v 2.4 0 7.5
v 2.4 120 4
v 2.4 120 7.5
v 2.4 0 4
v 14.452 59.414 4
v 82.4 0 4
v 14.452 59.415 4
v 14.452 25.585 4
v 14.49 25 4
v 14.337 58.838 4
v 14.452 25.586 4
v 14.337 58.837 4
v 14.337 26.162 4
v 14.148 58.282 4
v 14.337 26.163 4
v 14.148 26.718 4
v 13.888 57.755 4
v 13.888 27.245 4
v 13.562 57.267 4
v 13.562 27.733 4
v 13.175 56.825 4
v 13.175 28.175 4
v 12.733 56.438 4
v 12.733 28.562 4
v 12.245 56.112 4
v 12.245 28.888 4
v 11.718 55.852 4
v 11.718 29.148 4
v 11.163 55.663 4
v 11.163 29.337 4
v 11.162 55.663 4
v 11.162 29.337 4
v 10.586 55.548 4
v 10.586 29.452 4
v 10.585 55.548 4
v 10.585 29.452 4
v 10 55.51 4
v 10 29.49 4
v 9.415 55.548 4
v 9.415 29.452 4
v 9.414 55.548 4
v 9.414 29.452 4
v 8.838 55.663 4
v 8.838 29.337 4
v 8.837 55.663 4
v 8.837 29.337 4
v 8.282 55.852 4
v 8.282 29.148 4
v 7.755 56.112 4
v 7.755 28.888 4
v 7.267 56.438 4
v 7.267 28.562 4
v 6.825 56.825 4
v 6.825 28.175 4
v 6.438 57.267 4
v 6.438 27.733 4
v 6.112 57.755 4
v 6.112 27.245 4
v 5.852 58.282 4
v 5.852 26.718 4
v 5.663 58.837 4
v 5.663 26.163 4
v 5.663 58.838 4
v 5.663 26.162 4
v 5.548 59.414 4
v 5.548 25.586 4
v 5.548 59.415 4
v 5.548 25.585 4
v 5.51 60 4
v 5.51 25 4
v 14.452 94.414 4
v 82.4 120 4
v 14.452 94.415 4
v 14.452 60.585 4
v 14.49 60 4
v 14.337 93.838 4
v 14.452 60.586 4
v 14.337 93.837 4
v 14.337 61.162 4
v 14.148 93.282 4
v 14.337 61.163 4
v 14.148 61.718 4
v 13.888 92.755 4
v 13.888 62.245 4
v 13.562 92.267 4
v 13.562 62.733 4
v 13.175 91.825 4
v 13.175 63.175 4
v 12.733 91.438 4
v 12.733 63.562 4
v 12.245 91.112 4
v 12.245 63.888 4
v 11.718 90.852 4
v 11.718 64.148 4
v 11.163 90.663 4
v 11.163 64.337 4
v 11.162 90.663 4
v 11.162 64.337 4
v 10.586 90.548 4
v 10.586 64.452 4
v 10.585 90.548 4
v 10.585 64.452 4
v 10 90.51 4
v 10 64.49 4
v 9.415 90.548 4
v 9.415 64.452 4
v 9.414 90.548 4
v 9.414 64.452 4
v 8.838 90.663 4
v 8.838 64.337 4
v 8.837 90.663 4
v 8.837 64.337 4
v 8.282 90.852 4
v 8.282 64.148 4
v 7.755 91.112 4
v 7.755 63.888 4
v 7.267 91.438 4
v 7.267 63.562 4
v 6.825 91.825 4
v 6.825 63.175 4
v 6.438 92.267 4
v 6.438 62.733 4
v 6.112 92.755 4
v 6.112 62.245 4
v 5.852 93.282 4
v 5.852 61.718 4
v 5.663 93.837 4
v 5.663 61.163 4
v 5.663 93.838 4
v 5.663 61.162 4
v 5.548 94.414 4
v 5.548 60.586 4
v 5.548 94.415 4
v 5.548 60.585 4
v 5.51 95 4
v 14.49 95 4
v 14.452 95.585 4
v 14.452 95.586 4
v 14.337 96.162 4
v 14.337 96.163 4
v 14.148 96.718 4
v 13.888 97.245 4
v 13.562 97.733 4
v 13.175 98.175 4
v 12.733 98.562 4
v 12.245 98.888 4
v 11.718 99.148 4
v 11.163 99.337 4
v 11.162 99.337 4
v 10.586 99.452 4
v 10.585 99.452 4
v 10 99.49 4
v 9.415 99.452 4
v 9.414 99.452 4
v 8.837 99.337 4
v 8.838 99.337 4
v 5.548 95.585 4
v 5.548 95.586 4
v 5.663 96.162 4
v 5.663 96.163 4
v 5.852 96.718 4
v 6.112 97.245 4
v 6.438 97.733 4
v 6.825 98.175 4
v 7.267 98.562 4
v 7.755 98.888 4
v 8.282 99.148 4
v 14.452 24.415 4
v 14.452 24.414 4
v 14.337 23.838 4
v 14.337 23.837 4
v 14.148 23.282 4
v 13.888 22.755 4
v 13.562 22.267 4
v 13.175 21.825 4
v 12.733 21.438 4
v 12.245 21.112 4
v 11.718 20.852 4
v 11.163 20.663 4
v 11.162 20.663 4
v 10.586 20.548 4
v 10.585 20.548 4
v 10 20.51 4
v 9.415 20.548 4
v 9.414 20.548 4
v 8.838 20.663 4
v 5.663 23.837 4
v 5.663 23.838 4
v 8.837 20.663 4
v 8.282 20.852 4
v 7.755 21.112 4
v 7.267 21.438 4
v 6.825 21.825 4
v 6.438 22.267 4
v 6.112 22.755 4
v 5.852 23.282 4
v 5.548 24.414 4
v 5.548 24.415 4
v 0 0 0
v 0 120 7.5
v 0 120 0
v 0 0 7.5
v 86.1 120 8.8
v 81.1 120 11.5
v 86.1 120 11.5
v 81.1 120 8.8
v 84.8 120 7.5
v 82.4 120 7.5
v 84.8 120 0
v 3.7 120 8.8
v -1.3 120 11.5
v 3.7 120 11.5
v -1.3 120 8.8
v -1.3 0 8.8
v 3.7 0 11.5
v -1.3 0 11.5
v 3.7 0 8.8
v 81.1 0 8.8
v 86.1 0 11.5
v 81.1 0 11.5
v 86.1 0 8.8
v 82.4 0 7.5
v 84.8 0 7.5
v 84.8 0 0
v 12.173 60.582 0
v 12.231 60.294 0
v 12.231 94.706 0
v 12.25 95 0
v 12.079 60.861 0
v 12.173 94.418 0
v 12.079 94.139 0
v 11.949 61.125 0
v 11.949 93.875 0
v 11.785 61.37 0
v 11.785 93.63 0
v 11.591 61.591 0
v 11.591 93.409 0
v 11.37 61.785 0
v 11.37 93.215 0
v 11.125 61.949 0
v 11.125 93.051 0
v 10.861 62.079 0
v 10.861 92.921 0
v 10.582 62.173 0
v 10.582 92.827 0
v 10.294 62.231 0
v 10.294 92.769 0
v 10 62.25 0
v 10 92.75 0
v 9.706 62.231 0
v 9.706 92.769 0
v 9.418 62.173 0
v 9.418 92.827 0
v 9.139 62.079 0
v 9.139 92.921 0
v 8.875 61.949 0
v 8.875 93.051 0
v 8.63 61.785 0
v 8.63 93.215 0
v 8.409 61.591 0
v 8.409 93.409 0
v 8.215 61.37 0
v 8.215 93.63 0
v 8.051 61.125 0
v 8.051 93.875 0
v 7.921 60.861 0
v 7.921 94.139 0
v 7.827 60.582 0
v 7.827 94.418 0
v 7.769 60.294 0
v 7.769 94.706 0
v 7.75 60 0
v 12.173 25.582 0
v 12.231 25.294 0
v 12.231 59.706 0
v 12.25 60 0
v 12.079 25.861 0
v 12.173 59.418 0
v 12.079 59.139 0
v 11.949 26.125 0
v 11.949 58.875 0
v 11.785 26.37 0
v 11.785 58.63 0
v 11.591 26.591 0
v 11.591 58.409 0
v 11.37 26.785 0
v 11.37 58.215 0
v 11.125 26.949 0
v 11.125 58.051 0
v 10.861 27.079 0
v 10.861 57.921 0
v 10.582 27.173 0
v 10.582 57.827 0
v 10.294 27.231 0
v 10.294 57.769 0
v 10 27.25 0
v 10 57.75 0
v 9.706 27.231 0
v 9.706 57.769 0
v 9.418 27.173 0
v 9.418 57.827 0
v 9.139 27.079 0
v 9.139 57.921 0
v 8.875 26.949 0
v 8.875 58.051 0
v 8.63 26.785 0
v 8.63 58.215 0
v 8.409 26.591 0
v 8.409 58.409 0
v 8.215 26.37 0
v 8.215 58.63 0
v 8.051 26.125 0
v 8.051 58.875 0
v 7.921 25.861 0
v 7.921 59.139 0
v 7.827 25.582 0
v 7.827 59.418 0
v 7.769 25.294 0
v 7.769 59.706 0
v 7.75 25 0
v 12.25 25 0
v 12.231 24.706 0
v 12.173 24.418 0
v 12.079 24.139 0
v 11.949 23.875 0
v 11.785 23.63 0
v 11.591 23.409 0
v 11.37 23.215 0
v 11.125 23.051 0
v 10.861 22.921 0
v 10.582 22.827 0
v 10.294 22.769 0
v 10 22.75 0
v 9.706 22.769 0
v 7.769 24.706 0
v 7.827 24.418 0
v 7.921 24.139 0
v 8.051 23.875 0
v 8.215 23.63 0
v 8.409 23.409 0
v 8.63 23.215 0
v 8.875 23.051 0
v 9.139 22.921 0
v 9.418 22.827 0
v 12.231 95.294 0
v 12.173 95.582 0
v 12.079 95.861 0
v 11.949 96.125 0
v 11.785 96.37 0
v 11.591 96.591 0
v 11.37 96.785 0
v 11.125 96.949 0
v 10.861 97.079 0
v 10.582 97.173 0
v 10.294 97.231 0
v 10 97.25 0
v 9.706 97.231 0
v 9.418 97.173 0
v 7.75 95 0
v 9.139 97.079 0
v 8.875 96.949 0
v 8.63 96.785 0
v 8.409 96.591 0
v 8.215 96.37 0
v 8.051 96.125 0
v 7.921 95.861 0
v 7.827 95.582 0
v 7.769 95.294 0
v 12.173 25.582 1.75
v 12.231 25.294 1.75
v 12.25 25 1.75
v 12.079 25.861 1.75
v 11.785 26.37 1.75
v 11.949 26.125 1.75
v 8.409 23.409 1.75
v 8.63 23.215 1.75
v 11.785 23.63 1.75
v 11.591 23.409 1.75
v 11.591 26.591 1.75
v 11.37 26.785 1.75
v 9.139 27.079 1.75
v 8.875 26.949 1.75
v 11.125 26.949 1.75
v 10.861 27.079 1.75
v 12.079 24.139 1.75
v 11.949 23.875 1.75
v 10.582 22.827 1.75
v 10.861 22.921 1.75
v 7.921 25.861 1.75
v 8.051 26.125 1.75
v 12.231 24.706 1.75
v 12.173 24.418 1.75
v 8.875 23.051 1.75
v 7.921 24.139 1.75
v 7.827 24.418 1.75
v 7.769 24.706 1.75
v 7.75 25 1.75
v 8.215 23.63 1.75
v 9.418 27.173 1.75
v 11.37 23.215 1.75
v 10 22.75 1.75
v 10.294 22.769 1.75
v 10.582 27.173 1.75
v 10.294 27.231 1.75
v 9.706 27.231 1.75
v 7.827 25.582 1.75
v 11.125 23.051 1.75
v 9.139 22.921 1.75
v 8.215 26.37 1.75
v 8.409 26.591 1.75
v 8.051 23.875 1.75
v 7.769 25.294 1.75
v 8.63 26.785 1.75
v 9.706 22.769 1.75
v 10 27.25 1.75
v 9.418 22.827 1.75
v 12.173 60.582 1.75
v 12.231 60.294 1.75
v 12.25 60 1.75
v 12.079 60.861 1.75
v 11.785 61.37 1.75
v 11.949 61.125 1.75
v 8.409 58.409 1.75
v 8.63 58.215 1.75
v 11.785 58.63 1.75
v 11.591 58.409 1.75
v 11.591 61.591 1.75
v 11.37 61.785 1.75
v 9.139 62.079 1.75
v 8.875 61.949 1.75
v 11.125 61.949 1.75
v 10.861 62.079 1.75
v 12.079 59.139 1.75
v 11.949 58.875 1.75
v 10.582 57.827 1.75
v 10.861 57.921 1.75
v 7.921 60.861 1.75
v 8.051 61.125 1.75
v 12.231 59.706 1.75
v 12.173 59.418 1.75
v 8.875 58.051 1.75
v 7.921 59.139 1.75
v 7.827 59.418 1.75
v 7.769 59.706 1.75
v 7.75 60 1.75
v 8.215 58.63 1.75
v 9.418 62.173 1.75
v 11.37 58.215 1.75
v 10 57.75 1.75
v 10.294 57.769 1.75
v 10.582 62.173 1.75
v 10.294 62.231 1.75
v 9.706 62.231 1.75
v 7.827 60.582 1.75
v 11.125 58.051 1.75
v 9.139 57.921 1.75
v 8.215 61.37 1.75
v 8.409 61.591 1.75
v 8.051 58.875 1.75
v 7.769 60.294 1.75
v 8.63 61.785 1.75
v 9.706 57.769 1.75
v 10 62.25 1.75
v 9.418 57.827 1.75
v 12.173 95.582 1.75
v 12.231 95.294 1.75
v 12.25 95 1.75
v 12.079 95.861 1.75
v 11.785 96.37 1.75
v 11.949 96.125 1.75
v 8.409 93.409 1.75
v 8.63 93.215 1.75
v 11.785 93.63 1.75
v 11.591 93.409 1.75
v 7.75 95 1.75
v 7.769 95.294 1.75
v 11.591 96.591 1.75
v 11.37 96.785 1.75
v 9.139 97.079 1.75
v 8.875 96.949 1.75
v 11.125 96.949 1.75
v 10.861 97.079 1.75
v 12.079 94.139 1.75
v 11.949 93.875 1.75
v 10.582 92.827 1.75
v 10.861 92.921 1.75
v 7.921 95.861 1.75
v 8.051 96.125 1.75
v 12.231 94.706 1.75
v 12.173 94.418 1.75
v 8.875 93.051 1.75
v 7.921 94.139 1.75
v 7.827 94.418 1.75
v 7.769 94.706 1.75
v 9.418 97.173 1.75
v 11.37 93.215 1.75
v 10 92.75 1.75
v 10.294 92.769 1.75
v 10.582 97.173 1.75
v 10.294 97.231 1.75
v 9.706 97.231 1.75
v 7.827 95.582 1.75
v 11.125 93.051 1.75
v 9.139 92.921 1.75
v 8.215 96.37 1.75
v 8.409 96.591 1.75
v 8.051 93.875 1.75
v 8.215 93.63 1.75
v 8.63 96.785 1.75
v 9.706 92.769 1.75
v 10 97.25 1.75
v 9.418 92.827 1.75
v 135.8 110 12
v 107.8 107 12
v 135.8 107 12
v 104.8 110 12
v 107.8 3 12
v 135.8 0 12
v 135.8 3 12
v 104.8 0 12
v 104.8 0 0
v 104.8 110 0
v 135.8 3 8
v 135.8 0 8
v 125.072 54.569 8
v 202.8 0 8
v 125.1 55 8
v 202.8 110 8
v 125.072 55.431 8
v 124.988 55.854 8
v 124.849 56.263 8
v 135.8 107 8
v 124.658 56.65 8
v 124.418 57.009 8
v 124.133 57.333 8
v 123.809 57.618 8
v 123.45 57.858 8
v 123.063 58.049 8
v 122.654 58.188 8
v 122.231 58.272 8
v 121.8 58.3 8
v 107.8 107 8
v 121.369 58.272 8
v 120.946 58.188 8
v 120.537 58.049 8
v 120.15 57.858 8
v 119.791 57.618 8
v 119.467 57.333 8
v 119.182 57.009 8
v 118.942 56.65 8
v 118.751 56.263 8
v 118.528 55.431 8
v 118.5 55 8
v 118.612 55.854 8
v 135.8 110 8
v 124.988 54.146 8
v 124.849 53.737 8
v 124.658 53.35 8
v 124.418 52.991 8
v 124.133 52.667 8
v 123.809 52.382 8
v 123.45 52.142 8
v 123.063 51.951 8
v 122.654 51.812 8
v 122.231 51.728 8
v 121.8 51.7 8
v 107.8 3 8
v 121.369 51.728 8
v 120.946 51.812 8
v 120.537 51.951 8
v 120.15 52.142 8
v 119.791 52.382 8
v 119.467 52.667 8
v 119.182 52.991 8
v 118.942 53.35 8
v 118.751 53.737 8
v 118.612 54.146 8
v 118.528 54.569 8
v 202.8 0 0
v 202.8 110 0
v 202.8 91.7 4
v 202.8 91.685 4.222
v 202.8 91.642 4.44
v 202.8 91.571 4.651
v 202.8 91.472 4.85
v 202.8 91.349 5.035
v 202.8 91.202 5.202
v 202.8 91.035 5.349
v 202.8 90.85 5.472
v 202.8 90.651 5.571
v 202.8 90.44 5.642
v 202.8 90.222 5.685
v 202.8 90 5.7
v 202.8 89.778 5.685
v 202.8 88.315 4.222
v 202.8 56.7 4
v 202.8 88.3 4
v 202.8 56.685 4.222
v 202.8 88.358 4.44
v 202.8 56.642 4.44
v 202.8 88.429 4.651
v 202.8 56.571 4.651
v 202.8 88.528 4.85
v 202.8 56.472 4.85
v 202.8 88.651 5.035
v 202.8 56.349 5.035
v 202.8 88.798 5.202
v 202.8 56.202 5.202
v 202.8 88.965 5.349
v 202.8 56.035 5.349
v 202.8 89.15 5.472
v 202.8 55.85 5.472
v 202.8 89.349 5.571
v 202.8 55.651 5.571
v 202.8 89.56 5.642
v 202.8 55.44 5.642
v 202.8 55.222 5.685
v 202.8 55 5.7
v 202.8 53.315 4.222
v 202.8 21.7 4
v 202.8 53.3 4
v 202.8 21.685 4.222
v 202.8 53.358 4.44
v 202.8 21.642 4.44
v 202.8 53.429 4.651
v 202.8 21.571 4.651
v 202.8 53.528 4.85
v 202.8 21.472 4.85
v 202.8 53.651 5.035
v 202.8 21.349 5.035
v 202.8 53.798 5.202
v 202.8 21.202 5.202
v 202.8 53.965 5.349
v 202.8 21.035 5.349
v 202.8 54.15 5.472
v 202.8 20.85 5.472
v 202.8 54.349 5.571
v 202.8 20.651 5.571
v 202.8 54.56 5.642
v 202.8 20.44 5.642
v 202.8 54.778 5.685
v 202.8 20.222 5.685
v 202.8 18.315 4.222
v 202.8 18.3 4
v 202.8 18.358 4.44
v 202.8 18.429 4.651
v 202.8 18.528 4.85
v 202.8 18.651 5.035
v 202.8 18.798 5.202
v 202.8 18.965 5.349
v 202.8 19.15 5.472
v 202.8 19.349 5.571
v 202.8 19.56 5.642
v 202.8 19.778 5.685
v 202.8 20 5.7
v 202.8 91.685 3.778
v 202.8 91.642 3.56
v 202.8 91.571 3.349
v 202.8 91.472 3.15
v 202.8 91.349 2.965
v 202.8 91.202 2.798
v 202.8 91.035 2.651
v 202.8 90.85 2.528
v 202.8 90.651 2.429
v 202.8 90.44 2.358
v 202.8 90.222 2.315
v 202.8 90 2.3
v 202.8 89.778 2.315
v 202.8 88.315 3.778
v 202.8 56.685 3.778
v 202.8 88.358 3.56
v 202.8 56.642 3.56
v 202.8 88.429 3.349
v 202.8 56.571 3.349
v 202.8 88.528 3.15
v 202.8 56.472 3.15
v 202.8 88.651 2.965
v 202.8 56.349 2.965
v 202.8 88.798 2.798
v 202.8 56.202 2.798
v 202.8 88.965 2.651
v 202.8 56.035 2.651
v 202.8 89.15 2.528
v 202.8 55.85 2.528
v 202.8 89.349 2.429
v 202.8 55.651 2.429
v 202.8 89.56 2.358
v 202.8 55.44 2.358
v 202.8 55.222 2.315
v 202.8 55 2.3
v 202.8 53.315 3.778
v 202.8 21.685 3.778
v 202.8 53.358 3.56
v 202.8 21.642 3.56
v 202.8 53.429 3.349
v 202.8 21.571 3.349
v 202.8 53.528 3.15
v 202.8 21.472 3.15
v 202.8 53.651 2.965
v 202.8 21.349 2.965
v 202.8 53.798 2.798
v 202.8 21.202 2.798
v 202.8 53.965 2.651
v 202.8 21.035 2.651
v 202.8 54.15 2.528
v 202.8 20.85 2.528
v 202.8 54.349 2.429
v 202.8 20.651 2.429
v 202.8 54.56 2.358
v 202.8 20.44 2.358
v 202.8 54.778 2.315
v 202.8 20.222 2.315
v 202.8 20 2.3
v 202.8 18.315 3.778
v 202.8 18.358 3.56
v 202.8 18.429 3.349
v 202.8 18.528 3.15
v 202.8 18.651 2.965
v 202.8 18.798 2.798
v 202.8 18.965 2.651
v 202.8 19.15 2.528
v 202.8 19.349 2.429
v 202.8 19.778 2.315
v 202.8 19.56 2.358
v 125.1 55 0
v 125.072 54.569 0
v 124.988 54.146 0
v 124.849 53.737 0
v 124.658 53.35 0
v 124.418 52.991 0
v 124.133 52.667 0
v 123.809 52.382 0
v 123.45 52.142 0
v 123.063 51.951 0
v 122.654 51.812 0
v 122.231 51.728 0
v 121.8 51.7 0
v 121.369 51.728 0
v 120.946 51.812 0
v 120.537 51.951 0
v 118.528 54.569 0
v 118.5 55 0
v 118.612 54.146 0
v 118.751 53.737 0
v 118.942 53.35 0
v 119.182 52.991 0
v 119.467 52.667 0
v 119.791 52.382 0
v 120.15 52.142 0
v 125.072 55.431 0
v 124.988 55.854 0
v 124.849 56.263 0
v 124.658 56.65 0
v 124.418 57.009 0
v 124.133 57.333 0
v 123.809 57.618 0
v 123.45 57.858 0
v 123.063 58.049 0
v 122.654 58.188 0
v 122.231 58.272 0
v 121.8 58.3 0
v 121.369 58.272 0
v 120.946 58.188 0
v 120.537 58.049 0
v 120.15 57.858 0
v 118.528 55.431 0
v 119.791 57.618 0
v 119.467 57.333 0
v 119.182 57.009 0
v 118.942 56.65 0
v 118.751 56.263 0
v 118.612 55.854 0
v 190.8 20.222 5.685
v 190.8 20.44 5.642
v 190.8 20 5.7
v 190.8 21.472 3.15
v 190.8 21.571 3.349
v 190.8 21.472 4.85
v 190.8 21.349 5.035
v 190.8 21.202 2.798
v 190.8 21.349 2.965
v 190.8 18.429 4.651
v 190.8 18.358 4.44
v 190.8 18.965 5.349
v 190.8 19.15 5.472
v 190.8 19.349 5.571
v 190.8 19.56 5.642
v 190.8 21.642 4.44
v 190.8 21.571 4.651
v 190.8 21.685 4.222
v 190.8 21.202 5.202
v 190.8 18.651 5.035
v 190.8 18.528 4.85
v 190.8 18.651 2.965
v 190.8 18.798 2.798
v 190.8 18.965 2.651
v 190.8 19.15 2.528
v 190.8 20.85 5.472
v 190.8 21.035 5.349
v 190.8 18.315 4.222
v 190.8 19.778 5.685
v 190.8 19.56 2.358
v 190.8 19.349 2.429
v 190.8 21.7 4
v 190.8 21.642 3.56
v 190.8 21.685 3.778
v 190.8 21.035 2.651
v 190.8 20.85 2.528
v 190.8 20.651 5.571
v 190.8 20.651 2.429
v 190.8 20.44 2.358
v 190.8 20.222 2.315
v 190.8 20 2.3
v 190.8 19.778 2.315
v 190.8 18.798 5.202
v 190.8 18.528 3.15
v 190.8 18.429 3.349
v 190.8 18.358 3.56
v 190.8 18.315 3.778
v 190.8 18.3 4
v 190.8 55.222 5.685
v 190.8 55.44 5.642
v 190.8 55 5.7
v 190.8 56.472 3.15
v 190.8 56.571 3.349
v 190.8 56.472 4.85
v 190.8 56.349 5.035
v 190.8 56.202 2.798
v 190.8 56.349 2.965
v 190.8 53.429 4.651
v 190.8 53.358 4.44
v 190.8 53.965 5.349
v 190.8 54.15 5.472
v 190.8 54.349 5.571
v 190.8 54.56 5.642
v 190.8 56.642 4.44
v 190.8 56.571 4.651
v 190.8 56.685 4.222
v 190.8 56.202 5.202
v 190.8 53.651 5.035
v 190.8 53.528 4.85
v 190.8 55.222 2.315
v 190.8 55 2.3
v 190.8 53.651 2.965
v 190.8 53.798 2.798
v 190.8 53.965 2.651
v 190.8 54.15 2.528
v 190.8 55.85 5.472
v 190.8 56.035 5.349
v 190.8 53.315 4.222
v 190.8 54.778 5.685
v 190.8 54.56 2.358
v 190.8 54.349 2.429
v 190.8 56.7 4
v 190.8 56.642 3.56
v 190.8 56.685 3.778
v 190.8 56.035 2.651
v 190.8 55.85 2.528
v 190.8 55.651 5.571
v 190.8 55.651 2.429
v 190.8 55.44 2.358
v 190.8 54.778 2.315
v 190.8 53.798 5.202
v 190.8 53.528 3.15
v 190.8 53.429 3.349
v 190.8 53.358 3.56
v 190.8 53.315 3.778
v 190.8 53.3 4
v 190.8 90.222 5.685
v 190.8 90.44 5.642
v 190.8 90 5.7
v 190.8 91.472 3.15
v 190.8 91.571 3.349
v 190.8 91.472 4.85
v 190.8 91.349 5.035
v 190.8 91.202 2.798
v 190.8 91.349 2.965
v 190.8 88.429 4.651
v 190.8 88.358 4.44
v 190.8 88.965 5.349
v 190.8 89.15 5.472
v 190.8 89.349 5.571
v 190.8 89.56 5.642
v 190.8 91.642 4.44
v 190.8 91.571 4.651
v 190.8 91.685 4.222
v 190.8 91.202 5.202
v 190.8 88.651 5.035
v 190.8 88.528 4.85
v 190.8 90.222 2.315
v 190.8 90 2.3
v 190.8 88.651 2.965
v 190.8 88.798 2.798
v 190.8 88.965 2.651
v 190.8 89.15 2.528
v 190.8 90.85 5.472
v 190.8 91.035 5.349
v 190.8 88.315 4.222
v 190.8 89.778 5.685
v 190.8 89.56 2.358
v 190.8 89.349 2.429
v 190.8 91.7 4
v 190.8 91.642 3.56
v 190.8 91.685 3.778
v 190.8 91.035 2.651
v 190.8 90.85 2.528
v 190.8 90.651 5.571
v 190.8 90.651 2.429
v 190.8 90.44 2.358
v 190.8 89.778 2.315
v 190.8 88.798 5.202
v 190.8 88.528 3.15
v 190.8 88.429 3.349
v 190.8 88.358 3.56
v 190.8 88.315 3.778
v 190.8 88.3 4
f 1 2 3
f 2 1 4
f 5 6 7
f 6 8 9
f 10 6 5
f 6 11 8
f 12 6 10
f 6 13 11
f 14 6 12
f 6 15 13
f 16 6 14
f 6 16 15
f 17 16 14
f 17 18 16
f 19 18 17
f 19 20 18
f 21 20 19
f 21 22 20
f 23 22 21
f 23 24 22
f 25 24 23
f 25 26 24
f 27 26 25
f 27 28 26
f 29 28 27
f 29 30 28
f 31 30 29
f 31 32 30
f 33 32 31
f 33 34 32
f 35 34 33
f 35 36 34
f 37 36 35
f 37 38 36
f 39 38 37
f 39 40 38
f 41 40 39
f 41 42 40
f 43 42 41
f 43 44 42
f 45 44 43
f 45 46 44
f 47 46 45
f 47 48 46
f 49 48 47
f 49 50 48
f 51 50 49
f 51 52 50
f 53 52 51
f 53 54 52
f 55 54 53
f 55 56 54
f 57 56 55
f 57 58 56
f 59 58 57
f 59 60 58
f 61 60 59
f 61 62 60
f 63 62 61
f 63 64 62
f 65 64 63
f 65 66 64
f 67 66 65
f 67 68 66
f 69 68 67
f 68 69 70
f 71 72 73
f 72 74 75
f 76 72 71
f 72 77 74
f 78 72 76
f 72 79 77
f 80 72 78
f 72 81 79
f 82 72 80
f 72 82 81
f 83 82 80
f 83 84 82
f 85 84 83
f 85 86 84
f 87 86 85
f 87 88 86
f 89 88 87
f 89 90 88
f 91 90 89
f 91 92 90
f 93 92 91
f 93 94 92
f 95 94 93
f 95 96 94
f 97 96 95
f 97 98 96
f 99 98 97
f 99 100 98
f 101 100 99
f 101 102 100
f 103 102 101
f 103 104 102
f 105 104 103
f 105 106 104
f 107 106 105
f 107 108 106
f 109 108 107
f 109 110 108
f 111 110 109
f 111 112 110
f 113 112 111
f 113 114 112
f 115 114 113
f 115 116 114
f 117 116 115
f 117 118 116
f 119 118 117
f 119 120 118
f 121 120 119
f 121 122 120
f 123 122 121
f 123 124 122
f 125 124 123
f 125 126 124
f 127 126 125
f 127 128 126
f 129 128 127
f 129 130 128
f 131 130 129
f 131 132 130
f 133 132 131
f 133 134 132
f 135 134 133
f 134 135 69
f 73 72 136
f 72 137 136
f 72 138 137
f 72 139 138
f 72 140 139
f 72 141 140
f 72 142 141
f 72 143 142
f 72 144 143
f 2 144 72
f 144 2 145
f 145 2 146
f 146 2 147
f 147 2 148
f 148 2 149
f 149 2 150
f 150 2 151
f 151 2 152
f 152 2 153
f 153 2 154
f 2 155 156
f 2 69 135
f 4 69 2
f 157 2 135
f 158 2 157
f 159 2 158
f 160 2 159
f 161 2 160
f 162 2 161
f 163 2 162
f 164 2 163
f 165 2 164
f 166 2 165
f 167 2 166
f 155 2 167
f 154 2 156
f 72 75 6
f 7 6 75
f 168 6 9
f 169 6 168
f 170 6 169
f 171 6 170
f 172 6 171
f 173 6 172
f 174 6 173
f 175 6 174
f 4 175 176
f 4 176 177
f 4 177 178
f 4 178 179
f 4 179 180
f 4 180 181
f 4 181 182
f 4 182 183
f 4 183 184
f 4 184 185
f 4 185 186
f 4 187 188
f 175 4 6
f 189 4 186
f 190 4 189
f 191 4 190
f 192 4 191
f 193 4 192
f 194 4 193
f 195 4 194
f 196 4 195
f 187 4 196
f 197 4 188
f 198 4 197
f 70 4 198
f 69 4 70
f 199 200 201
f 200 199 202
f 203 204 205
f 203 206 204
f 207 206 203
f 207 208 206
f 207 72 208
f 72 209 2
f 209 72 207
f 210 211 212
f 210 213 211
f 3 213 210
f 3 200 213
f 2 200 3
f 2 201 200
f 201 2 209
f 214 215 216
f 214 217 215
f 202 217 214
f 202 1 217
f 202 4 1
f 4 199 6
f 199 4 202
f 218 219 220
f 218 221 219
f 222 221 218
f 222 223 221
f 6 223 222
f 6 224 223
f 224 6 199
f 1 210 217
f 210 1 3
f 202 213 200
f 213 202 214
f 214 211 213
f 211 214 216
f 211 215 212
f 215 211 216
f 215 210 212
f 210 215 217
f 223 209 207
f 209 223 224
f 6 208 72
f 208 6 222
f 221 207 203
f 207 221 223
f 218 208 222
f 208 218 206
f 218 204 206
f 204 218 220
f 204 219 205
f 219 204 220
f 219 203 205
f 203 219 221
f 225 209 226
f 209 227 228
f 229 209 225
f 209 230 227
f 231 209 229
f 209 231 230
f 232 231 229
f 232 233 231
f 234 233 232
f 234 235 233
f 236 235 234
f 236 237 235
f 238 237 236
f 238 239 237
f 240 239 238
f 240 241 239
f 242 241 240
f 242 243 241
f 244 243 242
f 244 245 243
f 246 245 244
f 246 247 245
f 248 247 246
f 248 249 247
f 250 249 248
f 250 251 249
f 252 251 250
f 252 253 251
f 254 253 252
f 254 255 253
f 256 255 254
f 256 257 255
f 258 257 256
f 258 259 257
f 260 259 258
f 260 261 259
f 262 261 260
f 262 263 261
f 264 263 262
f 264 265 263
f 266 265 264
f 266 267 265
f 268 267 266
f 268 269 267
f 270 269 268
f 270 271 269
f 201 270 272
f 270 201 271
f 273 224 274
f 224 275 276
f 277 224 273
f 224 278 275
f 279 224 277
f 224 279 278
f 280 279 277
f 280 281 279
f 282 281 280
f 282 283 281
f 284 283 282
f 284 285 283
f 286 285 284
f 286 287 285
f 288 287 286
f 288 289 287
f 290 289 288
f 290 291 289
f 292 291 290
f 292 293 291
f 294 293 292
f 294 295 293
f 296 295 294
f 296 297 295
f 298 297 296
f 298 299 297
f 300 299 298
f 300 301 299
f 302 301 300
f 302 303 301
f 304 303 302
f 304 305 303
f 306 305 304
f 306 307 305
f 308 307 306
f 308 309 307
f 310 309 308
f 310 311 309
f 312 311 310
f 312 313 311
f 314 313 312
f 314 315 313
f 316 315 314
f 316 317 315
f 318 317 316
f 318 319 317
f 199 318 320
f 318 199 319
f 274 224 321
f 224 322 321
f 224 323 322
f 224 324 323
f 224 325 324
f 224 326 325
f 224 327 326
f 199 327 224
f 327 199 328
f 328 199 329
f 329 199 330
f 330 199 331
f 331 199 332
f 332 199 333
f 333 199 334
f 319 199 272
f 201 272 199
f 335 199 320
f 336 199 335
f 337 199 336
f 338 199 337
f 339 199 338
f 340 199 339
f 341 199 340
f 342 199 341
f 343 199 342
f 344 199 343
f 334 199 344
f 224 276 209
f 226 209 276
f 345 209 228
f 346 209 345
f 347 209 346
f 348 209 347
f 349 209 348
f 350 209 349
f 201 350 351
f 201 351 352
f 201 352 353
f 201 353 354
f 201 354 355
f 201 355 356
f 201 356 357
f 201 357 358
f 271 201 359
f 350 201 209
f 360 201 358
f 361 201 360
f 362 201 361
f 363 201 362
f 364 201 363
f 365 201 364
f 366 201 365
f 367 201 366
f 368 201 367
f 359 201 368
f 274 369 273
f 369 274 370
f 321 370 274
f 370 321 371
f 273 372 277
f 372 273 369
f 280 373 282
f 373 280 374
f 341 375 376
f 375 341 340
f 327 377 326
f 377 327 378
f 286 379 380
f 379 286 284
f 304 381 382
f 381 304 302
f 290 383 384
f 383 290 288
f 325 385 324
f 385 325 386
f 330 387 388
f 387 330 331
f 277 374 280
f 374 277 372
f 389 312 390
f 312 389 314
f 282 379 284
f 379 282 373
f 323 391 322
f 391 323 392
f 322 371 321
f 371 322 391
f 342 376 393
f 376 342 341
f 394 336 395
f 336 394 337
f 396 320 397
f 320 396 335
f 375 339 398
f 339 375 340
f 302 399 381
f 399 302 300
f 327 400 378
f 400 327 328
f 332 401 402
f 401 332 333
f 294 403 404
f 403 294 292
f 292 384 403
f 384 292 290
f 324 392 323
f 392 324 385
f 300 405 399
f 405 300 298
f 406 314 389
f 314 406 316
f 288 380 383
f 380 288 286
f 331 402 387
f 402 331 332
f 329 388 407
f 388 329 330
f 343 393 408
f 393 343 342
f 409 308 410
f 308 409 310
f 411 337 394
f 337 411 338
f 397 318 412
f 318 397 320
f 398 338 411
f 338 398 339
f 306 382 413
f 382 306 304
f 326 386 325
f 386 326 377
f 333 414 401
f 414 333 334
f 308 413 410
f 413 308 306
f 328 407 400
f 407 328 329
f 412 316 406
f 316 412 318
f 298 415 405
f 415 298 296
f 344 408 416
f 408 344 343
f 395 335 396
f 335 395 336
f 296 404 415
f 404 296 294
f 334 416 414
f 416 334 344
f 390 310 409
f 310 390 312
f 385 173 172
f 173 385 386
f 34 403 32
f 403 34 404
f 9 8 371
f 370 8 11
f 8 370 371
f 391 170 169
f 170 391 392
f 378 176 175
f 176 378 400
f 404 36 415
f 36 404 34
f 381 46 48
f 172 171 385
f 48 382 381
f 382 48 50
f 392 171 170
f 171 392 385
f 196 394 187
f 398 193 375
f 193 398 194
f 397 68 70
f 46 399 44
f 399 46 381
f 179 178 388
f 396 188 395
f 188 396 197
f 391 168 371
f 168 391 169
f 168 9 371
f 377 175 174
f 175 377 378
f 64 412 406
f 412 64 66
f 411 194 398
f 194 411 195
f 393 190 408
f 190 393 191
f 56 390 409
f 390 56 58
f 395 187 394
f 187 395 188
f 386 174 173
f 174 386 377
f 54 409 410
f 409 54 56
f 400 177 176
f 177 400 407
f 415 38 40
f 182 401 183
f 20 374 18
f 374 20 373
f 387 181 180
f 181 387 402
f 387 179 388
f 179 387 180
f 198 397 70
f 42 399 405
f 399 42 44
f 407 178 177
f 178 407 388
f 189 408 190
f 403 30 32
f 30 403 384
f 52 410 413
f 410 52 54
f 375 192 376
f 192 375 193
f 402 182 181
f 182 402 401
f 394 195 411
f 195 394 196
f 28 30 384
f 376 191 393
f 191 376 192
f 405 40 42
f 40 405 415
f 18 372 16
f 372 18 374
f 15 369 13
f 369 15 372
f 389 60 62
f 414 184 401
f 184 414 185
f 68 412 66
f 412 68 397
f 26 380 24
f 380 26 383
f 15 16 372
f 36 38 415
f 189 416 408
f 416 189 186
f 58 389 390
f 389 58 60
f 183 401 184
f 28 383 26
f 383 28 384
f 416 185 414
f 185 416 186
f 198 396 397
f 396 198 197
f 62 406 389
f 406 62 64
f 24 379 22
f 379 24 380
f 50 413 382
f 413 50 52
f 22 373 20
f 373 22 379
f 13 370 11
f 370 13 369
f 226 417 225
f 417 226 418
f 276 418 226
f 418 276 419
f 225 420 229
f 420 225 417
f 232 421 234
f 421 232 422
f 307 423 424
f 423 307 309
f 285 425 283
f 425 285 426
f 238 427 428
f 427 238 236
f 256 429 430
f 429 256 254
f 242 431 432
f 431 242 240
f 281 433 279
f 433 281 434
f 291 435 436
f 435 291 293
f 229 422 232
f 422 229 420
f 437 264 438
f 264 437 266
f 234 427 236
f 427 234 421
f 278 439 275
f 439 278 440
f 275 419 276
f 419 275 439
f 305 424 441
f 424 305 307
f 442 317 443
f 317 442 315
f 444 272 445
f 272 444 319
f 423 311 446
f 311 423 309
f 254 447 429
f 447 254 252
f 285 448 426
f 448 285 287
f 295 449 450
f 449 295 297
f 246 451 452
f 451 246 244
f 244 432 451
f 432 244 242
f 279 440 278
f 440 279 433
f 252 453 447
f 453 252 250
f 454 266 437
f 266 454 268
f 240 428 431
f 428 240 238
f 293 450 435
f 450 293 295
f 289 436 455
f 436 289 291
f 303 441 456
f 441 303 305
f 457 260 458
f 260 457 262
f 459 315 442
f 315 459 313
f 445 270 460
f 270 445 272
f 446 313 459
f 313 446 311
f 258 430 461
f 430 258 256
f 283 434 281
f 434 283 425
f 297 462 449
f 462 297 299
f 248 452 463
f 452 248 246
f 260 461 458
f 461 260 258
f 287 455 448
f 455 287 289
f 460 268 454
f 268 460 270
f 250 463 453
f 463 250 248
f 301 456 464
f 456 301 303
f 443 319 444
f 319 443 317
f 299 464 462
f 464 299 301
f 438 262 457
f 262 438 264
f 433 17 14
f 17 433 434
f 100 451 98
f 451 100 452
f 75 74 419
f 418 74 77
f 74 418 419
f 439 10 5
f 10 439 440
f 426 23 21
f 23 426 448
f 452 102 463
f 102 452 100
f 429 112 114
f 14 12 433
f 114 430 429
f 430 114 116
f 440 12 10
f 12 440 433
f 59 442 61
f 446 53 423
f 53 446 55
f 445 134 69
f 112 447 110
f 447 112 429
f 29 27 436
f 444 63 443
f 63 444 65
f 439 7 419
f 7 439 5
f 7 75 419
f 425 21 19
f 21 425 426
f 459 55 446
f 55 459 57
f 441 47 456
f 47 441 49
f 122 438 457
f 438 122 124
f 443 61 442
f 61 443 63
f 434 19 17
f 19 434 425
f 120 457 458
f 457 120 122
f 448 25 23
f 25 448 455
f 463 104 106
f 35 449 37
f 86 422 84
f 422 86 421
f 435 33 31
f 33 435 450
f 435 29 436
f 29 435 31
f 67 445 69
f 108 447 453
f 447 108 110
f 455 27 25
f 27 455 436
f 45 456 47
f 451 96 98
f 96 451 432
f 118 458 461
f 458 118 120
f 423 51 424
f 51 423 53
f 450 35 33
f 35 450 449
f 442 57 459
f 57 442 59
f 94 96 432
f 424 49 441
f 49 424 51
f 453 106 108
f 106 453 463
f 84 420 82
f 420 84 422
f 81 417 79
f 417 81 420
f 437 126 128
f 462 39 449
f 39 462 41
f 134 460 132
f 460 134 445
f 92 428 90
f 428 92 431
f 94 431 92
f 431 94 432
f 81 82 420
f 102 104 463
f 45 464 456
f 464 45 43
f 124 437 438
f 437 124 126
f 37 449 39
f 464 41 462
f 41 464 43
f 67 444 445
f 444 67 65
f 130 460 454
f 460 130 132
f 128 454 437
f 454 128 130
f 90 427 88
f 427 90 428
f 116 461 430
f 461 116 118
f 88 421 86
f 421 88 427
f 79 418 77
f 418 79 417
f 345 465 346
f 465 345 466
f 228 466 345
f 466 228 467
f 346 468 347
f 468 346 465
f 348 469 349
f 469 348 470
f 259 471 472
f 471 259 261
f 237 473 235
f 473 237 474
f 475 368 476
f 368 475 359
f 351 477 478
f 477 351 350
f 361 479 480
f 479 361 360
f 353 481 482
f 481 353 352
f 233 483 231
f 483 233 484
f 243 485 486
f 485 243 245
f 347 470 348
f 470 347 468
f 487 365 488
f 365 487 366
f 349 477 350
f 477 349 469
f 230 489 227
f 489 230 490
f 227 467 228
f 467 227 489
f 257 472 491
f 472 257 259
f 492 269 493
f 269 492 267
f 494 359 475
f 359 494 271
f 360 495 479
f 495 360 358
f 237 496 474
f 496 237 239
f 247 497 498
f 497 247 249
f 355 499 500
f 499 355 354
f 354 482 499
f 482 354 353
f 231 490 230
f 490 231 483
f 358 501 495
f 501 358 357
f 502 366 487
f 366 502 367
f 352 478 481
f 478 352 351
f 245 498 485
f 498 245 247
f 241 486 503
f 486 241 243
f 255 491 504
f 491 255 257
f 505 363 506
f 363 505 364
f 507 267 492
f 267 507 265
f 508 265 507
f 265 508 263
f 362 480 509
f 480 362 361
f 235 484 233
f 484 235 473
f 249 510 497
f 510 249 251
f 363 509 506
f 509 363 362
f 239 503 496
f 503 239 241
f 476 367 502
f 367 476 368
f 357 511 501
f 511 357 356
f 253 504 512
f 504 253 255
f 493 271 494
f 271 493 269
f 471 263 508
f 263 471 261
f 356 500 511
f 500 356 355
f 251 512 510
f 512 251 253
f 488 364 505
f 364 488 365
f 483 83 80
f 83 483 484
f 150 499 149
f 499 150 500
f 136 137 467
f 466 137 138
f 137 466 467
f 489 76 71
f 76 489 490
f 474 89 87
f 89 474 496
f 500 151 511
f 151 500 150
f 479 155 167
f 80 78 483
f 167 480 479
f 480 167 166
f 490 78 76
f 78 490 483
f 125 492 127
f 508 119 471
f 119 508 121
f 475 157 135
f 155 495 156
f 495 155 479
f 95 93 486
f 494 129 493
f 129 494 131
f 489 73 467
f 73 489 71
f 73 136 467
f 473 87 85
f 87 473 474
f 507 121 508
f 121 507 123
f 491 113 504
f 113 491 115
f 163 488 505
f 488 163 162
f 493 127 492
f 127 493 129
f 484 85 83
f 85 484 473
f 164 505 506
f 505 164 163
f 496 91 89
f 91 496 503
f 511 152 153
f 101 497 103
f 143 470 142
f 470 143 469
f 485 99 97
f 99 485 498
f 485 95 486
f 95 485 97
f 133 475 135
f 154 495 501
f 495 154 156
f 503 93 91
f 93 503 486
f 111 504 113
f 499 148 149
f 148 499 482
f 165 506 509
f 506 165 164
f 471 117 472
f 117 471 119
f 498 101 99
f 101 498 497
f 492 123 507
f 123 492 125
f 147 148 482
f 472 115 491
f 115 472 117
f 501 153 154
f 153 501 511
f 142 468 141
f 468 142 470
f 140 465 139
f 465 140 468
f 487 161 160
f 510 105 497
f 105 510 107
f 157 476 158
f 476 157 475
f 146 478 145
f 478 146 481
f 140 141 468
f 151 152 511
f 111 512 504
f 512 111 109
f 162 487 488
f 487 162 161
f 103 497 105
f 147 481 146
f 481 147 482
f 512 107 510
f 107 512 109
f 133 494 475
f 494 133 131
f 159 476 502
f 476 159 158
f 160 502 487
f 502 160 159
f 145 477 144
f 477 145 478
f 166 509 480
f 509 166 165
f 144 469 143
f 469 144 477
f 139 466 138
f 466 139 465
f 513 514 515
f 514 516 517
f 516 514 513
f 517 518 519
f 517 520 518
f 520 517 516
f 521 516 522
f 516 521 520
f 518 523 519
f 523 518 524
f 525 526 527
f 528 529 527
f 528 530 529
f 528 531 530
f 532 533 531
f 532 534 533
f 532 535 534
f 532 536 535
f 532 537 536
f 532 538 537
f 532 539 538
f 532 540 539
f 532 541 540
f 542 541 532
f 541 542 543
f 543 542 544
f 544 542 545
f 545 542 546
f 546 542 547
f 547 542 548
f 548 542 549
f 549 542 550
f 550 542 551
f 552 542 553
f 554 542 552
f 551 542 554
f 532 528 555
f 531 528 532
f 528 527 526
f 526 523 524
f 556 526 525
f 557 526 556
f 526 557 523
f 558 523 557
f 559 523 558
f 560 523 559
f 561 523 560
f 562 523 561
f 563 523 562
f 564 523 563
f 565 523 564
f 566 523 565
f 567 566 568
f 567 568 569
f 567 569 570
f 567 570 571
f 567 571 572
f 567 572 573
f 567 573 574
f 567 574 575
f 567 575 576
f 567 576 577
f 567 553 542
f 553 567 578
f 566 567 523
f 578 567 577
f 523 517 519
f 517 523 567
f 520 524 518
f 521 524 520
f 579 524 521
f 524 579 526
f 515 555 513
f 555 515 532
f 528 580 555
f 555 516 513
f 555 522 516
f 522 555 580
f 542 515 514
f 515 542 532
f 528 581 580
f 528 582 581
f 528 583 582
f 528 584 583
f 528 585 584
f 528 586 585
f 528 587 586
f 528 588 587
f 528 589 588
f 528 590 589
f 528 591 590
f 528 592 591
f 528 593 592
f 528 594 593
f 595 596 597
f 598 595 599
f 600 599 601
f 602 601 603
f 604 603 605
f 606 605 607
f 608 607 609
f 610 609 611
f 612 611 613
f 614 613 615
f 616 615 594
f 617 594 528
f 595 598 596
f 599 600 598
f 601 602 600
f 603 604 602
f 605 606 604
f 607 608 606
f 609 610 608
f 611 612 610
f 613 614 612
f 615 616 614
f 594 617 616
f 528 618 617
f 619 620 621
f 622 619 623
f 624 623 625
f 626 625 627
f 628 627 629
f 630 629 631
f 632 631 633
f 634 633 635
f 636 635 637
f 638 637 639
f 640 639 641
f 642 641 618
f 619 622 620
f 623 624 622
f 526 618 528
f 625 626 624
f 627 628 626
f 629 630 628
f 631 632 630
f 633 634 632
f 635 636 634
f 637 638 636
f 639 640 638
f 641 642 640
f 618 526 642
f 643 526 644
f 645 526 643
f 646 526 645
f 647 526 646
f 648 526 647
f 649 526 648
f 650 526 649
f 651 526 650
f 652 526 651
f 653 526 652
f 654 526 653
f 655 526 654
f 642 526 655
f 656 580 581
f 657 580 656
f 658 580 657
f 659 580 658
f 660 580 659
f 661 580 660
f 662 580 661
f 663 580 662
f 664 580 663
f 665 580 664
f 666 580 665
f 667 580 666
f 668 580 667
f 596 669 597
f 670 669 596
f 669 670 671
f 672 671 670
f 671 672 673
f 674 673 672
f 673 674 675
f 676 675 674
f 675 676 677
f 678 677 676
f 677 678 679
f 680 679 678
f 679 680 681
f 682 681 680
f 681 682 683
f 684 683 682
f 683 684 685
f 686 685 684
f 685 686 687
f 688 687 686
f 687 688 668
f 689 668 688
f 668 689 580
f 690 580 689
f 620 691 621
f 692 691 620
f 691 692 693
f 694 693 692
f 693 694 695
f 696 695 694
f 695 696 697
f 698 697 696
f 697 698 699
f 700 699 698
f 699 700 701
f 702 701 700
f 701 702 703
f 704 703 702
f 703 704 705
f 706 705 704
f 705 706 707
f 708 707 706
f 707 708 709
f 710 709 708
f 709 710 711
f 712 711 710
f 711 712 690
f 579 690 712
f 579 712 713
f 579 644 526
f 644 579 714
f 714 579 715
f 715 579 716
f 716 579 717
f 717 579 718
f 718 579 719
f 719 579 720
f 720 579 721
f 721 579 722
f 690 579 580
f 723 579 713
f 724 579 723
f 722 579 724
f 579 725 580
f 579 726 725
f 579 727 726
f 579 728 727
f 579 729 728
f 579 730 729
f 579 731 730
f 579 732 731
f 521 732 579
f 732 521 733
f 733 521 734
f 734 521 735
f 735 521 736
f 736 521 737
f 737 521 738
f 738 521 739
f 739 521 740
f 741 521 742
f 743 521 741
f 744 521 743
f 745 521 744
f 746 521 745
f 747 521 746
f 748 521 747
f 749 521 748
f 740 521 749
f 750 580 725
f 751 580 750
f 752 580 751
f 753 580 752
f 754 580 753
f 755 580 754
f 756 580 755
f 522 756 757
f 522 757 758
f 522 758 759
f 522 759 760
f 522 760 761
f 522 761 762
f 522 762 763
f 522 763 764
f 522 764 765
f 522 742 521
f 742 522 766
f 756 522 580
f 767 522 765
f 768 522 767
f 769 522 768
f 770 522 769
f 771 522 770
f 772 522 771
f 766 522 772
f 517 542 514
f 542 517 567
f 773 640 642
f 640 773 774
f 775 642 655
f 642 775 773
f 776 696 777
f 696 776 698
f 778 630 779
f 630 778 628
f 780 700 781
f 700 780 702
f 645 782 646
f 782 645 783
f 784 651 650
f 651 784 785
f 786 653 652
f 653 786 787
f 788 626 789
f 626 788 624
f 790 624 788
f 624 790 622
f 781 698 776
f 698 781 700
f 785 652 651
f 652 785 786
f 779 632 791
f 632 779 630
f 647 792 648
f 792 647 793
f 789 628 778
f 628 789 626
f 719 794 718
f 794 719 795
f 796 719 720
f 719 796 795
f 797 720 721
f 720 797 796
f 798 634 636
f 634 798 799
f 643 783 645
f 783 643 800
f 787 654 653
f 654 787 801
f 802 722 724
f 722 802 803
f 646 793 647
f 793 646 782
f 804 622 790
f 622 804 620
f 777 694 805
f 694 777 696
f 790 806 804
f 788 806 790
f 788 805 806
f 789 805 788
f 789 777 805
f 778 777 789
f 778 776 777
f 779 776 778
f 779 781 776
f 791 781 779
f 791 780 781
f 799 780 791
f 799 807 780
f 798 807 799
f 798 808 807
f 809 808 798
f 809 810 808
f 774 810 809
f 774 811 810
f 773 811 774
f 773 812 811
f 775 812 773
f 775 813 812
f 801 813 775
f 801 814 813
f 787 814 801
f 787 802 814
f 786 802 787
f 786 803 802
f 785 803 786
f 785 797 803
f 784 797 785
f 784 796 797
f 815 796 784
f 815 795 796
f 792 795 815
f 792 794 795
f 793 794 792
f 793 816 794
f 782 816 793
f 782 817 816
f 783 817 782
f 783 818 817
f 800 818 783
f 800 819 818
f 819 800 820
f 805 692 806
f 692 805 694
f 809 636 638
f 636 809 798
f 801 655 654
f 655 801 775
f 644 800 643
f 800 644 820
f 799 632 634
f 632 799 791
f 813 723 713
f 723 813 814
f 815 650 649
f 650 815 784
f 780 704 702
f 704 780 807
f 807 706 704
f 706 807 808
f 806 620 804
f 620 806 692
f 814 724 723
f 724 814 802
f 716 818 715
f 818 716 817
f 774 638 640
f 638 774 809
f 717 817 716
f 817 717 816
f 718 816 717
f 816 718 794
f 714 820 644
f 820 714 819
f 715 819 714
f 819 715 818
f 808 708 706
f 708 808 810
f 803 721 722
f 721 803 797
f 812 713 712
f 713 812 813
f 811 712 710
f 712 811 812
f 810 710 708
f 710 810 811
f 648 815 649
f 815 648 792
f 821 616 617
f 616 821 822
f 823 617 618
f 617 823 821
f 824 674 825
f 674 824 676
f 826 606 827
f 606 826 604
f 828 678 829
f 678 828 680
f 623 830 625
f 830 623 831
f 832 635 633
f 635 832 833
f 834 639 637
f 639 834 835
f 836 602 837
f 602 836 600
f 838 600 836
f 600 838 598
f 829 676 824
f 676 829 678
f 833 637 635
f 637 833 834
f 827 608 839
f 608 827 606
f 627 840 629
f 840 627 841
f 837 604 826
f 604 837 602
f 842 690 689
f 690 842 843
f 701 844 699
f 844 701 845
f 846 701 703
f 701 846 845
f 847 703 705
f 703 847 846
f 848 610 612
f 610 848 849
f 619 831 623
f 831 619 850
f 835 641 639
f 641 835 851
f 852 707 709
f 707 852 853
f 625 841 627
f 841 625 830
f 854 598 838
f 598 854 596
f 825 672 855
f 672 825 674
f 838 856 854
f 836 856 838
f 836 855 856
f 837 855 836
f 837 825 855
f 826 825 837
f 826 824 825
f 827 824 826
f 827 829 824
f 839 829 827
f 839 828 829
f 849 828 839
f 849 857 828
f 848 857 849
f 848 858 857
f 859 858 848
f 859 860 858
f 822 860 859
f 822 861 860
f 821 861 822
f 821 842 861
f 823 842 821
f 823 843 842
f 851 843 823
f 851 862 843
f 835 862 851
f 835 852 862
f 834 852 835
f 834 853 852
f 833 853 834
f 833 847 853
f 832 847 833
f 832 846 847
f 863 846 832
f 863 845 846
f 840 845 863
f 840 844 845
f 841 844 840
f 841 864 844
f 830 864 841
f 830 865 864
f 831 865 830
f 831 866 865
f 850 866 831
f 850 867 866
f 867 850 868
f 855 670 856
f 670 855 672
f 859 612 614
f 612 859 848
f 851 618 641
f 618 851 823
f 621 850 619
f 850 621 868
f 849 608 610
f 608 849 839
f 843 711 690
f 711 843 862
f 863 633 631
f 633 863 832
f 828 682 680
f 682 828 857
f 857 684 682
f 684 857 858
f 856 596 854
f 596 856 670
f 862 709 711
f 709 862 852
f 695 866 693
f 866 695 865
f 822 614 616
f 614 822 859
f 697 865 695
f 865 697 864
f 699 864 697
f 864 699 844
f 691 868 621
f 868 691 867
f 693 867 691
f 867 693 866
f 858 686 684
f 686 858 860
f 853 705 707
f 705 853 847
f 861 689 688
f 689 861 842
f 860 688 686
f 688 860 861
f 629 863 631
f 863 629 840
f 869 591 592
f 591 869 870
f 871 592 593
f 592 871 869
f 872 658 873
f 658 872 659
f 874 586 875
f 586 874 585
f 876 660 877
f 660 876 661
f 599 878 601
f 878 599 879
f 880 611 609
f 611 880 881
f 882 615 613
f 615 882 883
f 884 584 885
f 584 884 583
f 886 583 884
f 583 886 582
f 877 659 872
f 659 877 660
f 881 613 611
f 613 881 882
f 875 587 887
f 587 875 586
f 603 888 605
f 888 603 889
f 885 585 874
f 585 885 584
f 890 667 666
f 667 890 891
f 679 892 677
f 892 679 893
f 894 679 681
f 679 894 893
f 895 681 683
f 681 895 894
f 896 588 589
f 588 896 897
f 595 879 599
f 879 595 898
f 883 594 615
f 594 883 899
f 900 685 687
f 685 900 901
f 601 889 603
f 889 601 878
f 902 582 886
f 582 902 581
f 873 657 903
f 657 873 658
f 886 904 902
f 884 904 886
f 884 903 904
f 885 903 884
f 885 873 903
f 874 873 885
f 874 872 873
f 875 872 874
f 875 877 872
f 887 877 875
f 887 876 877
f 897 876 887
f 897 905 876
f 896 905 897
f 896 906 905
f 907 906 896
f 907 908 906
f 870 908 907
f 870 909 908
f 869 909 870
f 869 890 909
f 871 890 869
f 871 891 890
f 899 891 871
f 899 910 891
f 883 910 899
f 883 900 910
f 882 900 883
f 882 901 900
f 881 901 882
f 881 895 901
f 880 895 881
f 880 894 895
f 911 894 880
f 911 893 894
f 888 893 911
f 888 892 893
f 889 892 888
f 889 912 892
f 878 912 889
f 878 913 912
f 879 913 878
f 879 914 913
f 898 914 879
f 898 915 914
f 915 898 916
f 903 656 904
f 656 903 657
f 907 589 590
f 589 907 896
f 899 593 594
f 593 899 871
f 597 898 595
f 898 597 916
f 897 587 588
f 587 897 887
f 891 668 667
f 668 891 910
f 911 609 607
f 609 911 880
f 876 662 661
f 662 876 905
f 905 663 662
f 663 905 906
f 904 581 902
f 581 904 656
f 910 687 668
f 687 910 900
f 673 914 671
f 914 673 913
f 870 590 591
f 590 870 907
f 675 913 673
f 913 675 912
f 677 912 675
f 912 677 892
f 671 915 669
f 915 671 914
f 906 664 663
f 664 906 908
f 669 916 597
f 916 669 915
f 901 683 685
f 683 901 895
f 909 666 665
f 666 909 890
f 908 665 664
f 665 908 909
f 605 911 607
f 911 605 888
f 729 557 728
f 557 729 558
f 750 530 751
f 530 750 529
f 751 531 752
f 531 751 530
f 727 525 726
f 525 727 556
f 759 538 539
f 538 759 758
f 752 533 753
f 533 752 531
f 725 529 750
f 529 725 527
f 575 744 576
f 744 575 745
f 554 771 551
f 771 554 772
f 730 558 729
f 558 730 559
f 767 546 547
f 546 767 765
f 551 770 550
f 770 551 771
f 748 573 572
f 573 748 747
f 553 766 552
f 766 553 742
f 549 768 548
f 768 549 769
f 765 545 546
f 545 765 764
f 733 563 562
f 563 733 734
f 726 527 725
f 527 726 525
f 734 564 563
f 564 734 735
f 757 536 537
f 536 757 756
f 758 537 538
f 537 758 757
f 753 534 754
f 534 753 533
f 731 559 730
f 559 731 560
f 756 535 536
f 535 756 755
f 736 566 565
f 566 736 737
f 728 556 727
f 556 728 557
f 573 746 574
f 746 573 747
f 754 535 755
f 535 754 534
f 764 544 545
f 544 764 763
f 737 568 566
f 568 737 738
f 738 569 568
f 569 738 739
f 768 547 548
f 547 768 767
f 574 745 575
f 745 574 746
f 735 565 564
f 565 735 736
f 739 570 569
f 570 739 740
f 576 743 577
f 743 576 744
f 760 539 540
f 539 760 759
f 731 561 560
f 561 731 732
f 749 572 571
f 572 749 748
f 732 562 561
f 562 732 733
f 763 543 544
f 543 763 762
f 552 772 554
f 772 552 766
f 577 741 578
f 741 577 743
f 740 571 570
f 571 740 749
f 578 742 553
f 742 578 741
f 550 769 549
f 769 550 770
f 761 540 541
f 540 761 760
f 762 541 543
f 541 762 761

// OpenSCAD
// A hanger for a webcam on the same ceiling plate as the phone pocket, for
// Lantern's camera over the cutting table.
//
// Two printed parts, three screws and the camera's own tripod bolt:
//   slider  a deck with a beaded rail along each side; slides into the
//           plate's channels in place of the pocket (plate.stl from
//           phone-pocket.scad, unchanged).
//   hanger  a slab that screws to the deck's underside and hangs down one
//           side of the camera; the camera's tripod thread bolts to it, lens
//           down, and a ridge along its foot and at each end keep the camera
//           square and stop it swinging on the bolt.
// The camera's cable socket is on its back, so with the lens looking down
// the plug points up at the ceiling: the hanger drops the camera far enough
// for the plug and the cable's bend. If a right-angle plug is used later,
// shorten `plug_room`.
//
// Drawn for a Logitech Brio 4K: a 103 × 28 × 28 mm bar, lens on the front,
// USB-C socket on the back, 1/4 in thread in the middle of one long side.
// For another camera, change the numbers at the top.
//
// Both parts print without supports: the slider deck down with its rails
// up, the hanger flat on its outer face. PETG, 0.2 mm layers, 4 walls.
//
// Render with OpenSCAD:
//   openscad -o webcam-slider.stl -D 'part="slider"' webcam-hanger.scad
//   openscad -o webcam-hanger.stl -D 'part="hanger"' webcam-hanger.scad

// ---------- the camera
cam_l = 103;        // length, along the slide (the picture is wide this way)
cam_h = 28;         // height, lens face to back (the socket's face)
cam_w = 28;         // width, thread face to the other side
thread_from_end = 51.5;   // the tripod thread's distance from one end of the camera
thread_from_lens = 14;    // ... and from the lens face
plug_room = 52;     // how far the plug and its strain relief stand out of the back
cable_bend = 15;    // room above the plug for the cable to turn along the ceiling
bolt_d = 6.6;       // clearance for a 1/4 in bolt
cheek_t = 8;        // the hanger's thickness; the camera bolt must have more thread than this

// ---------- the hanger
ridge = 4;          // how far the ridges stand proud of the cheek, under the camera's edge and at its ends
ridge_t = 3;        // the ridges' thickness
end_gap = 0.5;      // clearance between the camera and each end ridge
hanger_l = cam_l + 2 * end_gap + 2 * ridge_t;
screw_pilot = 3.4;  // for a 4 mm screw cut into the hanger's top edge
screw_depth = 12;
screws = [20, hanger_l / 2, hanger_l - 20];   // along the length

// ---------- the slider: the same slide as the pocket, so it fits the same plate
wall = 2.4;         // the rail's thickness, matching the pocket's wall
bead = 1.3;         // the bead stands proud this much each side
bead_h = 4;
slide_gap = 0.5;
post = 3;           // the plate's channel lip thickness; the rail's plain part passes through it
outer_w = 76 + 2 * 2 + 2 * wall;   // the pocket's outer width: phone 76 + clearance 2 each side + walls
deck_t = 4;
slider_l = hanger_l + 10;
rail_h = post + slide_gap + bead_h;  // above the deck
cheek_from_edge = 6;    // the hanger's outer face sits this far in from the deck's edge, clear of the rail
screw_d = 4.5;      // clearance for a 4 mm screw through the deck
screw_head = 9;     // countersink

part = "both";      // "slider", "hanger", "both" (side by side), "fitted" (as hung, with the camera)

// ---------- derived
drop = plug_room + cable_bend;         // the camera's back below the deck
cheek_h = drop + cam_h + ridge_t;      // the hanger's height below the deck
bolt_y = drop + cam_h - thread_from_lens;   // the bolt's centre below the deck
screw_x = cheek_from_edge + cheek_t / 2;

$fn = 48;

module bead_profile(len) {
  // a rail the length `len`: a plain wall with a bead at the top, chamfered below so it prints deck down
  hull() {
    translate([-bead, 0, bead]) cube([wall + 2 * bead, len, bead_h - bead]);
    cube([wall, len, bead_h]);
  }
}

module slider() {
  difference() {
    union() {
      cube([outer_w, slider_l, deck_t]);
      for (x = [0, outer_w - wall]) {
        translate([x, 0, deck_t]) cube([wall, slider_l, rail_h - bead_h]);
        translate([x, 0, deck_t + rail_h - bead_h]) bead_profile(slider_l);
      }
    }
    // countersunk screws down into the hanger's top edge
    for (y = screws) translate([screw_x, y + (slider_l - hanger_l) / 2, 0]) {
      translate([0, 0, -1]) cylinder(d = screw_d, h = deck_t + 2);
      translate([0, 0, deck_t - (screw_head - screw_d) / 2]) cylinder(d1 = screw_d, d2 = screw_head, h = (screw_head - screw_d) / 2 + 0.01);
    }
  }
}

// The hanger as it hangs: x across the camera (0 at the outer face), y along the slide, z down from the deck.
module hanger() {
  difference() {
    union() {
      cube([cheek_t, hanger_l, cheek_h]);
      // the ridge under the camera's lower edge, and one at each end
      translate([cheek_t, 0, cheek_h - ridge_t]) cube([ridge, hanger_l, ridge_t]);
      for (y = [0, hanger_l - ridge_t]) translate([cheek_t, y, drop]) cube([ridge, ridge_t, cam_h + ridge_t]);
    }
    // the camera bolt
    translate([-1, ridge_t + end_gap + thread_from_end, bolt_y]) rotate([0, 90, 0]) cylinder(d = bolt_d, h = cheek_t + 2);
    // pilot holes for the screws from the deck
    for (y = screws) translate([cheek_t / 2, y, -1]) cylinder(d = screw_pilot, h = screw_depth + 1);
  }
}

// The hanger laid flat on its outer face, ridges up, for printing: its height runs along x.
module hanger_flat() {
  translate([cheek_h, 0, 0]) rotate([0, -90, 0]) hanger();
}

module camera() {
  // the camera as held: thread face on the cheek, lens down, back up, the plug rising from it
  color("dimgray") translate([cheek_t, ridge_t + end_gap, drop]) hull() {
    for (x = [8, cam_w - 8], z = [8, cam_h - 8]) translate([x, 0, z]) rotate([-90, 0, 0]) cylinder(r = 8, h = cam_l);
  }
  color("black") translate([cheek_t + cam_w / 2, ridge_t + end_gap + cam_l / 2, drop - plug_room]) cylinder(d = 11, h = plug_room);
}

module fitted() {
  // the deck above, the hanger below, as hung from the plate (z up on screen)
  mirror([0, 0, 1]) {
    translate([-cheek_from_edge, -(slider_l - hanger_l) / 2, 0]) mirror([0, 0, 1]) slider();
    hanger();
    camera();
  }
}

if (part == "slider") slider();
else if (part == "hanger") hanger_flat();
else if (part == "fitted") fitted();
else {
  slider();
  translate([outer_w + 20, 0, 0]) hanger_flat();
}
